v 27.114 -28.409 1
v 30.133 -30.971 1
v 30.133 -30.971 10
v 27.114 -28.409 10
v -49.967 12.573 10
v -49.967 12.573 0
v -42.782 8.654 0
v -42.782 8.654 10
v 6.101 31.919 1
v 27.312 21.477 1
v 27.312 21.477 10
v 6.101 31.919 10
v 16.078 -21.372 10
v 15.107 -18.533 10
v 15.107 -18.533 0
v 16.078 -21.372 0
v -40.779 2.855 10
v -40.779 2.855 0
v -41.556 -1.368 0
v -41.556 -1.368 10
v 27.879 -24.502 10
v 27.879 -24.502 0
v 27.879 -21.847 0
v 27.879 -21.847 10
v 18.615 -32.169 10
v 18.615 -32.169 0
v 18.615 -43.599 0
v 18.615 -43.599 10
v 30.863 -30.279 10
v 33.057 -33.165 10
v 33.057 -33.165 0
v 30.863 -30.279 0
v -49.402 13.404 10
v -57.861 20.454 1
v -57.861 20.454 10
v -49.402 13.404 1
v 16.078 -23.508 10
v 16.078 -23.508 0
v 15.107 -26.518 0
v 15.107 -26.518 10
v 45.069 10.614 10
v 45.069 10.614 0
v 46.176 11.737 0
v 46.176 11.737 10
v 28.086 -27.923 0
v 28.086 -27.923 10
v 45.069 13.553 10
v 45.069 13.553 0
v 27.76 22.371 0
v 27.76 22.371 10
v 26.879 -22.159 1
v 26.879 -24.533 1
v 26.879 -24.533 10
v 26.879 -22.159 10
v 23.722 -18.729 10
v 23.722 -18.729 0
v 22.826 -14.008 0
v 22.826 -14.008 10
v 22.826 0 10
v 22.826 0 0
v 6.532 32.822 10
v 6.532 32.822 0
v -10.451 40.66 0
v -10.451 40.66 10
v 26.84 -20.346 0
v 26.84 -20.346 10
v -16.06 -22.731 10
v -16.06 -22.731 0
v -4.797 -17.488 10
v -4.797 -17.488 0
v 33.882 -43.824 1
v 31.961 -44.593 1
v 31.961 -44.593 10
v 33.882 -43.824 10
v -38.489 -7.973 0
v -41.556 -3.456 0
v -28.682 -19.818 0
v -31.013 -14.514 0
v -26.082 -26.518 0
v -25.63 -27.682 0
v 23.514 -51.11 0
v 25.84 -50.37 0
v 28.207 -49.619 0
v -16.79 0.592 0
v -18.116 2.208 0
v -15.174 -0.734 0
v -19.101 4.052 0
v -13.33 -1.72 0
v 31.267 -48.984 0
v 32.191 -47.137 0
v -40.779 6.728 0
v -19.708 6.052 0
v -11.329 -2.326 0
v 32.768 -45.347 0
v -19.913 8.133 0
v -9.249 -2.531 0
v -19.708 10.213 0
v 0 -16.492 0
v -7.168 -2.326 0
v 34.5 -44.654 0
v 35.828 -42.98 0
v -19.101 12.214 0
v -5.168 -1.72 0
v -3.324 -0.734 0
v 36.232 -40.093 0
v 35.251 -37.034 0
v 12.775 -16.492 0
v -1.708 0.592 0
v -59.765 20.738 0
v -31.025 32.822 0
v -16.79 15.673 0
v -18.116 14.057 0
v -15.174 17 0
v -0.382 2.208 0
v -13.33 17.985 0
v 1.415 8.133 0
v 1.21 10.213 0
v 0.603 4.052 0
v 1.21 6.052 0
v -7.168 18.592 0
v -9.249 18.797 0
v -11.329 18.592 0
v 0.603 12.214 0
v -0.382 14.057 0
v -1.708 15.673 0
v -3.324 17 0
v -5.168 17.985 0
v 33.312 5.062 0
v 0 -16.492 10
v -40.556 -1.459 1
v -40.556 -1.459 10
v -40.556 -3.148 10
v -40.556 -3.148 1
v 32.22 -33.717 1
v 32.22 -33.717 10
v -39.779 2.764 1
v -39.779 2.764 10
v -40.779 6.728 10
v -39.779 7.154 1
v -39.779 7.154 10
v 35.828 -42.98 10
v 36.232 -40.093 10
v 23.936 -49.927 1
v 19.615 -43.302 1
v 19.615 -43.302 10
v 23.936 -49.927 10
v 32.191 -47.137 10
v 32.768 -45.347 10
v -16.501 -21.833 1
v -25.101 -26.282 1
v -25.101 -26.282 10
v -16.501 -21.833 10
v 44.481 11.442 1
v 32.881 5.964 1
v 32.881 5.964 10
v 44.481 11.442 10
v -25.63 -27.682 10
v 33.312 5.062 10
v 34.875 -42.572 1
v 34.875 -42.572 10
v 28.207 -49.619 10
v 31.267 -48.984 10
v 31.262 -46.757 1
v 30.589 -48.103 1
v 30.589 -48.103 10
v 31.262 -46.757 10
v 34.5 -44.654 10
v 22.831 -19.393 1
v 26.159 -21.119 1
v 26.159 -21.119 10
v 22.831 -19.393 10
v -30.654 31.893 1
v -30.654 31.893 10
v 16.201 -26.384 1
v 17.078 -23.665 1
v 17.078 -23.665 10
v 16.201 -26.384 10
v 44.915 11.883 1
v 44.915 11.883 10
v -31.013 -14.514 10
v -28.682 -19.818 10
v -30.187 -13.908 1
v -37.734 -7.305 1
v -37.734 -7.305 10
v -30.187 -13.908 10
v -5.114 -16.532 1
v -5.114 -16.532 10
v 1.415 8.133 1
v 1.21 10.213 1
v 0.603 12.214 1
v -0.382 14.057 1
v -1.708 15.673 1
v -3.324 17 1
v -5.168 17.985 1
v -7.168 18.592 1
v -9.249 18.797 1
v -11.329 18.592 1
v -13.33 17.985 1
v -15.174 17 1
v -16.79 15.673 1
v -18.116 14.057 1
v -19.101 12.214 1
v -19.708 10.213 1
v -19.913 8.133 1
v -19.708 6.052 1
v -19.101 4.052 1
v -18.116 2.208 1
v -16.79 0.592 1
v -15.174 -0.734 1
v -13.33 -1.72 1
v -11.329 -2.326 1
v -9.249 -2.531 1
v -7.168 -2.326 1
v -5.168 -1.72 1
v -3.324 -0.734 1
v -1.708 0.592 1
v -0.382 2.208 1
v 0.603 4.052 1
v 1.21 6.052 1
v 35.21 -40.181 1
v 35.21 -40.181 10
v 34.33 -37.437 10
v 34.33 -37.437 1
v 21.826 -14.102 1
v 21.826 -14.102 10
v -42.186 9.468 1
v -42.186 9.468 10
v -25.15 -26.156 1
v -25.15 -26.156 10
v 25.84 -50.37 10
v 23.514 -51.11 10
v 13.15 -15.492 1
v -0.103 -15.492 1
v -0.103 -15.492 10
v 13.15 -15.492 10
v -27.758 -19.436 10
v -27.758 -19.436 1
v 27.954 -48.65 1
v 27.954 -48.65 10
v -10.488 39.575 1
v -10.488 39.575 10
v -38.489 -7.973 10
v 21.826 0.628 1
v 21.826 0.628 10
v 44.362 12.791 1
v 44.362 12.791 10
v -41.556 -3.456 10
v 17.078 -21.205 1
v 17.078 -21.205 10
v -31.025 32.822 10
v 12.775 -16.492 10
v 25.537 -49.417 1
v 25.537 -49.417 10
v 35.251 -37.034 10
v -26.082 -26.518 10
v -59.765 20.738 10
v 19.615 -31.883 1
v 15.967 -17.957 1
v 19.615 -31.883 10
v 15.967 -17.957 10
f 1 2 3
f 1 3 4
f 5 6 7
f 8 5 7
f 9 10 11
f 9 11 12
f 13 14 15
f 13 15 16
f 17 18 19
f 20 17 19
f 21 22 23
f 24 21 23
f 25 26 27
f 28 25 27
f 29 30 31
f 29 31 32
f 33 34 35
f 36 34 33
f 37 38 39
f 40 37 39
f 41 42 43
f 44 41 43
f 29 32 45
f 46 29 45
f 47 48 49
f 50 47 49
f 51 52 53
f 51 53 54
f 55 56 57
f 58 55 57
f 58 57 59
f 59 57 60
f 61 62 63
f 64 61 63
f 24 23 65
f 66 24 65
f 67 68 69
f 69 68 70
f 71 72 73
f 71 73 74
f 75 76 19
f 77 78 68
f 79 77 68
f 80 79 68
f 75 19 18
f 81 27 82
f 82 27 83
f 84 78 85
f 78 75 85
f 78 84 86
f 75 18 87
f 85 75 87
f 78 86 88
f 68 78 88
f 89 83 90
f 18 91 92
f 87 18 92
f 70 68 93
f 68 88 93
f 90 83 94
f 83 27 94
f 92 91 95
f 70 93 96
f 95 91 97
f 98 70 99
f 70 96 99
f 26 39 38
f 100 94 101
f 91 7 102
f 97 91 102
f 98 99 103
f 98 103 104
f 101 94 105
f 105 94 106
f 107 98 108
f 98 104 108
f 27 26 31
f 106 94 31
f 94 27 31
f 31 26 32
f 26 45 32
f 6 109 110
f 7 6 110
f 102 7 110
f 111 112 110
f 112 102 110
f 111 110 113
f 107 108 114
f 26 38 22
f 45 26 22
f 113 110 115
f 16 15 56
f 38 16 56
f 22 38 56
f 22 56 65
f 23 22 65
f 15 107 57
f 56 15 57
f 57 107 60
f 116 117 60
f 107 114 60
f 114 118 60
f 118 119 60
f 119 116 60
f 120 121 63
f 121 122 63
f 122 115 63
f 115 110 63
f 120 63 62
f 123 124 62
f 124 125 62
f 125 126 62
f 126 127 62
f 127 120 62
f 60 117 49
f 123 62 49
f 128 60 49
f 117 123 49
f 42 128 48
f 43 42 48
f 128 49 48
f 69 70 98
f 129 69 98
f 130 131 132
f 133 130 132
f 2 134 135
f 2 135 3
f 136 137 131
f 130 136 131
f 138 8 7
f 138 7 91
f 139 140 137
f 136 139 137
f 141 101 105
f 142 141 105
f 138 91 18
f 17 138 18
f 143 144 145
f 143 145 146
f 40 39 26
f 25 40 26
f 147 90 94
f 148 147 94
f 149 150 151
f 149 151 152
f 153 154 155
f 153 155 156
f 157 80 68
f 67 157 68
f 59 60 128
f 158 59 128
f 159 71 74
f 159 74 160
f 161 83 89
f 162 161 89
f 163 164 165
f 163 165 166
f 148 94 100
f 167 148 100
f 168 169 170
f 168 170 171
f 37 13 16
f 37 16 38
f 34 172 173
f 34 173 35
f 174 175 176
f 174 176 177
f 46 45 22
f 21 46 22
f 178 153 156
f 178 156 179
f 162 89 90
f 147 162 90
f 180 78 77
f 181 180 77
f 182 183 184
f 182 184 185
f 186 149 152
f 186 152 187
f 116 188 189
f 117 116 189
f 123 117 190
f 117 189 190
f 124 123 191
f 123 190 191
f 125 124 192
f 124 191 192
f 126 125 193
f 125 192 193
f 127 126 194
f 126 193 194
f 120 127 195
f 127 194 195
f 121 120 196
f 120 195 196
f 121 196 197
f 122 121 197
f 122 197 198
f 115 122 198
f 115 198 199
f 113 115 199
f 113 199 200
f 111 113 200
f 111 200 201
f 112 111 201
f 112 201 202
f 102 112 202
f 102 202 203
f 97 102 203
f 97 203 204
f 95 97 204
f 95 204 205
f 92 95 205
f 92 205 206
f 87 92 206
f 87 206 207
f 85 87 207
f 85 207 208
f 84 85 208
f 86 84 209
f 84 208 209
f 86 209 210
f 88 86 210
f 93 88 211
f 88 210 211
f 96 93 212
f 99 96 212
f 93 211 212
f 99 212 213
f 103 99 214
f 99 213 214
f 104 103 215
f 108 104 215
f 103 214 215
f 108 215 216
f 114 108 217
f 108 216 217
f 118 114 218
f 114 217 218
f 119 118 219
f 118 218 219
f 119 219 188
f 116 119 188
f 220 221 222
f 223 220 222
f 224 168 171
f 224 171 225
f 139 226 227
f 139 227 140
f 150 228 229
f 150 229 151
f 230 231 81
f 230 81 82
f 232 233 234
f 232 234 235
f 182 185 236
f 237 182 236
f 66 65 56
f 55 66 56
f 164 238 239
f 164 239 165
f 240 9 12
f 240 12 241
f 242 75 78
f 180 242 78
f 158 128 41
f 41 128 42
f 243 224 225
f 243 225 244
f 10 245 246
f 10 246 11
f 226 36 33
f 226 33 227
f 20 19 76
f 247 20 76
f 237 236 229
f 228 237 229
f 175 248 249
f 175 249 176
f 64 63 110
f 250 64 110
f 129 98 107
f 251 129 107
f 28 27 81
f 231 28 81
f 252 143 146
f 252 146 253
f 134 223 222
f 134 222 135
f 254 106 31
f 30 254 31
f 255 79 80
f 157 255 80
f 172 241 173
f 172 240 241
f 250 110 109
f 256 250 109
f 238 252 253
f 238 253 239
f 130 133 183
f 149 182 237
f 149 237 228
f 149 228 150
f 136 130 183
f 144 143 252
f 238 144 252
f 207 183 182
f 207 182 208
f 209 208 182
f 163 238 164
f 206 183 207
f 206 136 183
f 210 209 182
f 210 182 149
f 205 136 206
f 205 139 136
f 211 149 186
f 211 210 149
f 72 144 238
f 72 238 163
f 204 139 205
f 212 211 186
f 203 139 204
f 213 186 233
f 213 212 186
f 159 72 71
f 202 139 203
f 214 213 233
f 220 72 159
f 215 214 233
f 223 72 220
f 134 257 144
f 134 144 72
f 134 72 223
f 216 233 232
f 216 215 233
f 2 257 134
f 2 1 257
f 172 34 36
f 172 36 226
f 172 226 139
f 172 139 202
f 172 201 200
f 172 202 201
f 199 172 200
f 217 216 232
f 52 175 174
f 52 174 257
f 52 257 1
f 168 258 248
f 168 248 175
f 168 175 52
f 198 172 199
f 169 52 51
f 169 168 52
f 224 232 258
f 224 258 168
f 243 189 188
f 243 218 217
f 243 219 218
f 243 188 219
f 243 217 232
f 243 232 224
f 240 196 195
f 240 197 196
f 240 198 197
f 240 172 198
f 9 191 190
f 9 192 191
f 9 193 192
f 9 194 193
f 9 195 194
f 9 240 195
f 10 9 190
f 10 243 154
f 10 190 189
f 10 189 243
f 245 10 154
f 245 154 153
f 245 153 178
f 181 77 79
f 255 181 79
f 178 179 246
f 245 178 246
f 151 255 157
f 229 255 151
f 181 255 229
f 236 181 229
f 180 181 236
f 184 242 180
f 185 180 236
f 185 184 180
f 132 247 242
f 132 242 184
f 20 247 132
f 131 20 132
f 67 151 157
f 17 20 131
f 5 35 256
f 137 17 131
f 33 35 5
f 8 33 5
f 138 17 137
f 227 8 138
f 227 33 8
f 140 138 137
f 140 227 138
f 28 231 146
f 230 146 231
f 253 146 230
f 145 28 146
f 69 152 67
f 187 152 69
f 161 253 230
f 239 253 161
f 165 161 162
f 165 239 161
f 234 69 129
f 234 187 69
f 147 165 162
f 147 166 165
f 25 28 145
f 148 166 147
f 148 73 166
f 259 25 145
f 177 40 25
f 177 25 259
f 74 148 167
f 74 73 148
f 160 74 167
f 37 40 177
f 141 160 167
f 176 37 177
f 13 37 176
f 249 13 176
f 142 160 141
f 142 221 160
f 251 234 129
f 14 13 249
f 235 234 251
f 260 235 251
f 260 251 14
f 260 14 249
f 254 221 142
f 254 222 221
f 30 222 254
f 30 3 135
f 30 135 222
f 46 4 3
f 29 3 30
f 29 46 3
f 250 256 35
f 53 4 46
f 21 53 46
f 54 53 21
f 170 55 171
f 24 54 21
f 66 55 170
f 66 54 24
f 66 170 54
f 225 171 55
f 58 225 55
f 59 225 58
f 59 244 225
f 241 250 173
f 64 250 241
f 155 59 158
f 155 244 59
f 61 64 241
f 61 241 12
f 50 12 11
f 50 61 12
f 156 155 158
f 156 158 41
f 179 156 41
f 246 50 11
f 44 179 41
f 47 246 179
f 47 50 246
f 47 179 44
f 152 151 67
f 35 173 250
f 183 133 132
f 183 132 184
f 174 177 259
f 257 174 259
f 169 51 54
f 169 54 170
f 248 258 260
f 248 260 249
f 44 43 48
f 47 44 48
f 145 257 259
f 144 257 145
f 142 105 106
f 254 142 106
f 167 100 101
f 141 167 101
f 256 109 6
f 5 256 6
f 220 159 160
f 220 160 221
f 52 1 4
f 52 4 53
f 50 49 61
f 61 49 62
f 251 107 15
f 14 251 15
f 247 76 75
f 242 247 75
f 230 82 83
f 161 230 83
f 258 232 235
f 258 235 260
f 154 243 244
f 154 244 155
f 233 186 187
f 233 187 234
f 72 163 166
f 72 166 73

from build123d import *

# Parameters (mm, degrees)
F1_DEPTH = 10
F2_T     = -1
F3_R     = 10.6640979673
F4_DEPTH = 25


with BuildPart() as f1:
    # F0 (on Top) → F1 (new body)
    with BuildSketch(Plane.XY):
        Polygon((-31.0254581273, 32.8216664493), (-59.7648322582, 20.7380689681), (-49.9673187733, 12.5734750181), (-42.7824743092, 8.6544696242), (-40.7788045704, 6.7279691546), (-40.7788045704, 2.8554322198), (-41.5555574, -1.3681541895), (-41.5555574, -3.4556735773), (-38.4888425469, -7.9726679251), (-31.0126114637, -14.5143707892), (-28.6823585629, -19.8181271553), (-26.0819279657, -26.5176091343), (-25.6298921539, -27.6821877156), (-16.0601455718, -22.7309465408), (-4.7972491011, -17.4878742546), (0, -16.4924804121), (12.7747104677, -16.4924804121), (15.1070067659, -18.5332398809), (16.0779468715, -21.3716309518), (16.0779468715, -23.5076975077), (15.1070067659, -26.5176091343), (18.6152737588, -32.1685001254), (18.6152737588, -43.598935008), (23.5140342265, -51.1103607714), (25.8403085172, -50.369720906), (28.2073356211, -49.6192015707), (31.2671549618, -48.984143883), (32.1908704937, -47.136709094), (32.7681936324, -45.3470014036), (34.5001667738, -44.6542128921), (35.8280129731, -42.9799742997), (36.2321399152, -40.0933548808), (35.2506898344, -37.0335392654), (33.0568552017, -33.1654660404), (30.863026157, -30.2788466215), (28.0862059444, -27.9229115695), (27.8792269528, -24.5023760945), (27.8792269528, -21.8466855586), (26.8400404602, -20.3456450254), (23.7224902958, -18.7291372567), (22.8264033794, -14.0075832605), (22.8264033794, 0), (33.3115458488, 5.0620483235), (45.0685583055, 10.6139723212), (46.1755990982, 11.7365671322), (45.0685583055, 13.5532263666), (27.7596209198, 22.3709885031), (6.5316753462, 32.8216664493), (-10.4506798089, 40.6596809626), align=None)
    extrude(amount=F1_DEPTH)

    # F2
    f2_openings = [f1.faces().sort_by_distance(p)[0] for p in [
        (-4.783125, 4.353197, 10),
    ]]
    offset(amount=F2_T, openings=f2_openings, kind=Kind.INTERSECTION)

    # F3 (on face) → F4 (cut)
    with BuildSketch(Plane.XY.offset(1)):
        with Locations((-9.2489561066, 8.1327119842)):
            Circle(F3_R)
    extrude(amount=-F4_DEPTH, mode=Mode.SUBTRACT)


solid = f1.part
